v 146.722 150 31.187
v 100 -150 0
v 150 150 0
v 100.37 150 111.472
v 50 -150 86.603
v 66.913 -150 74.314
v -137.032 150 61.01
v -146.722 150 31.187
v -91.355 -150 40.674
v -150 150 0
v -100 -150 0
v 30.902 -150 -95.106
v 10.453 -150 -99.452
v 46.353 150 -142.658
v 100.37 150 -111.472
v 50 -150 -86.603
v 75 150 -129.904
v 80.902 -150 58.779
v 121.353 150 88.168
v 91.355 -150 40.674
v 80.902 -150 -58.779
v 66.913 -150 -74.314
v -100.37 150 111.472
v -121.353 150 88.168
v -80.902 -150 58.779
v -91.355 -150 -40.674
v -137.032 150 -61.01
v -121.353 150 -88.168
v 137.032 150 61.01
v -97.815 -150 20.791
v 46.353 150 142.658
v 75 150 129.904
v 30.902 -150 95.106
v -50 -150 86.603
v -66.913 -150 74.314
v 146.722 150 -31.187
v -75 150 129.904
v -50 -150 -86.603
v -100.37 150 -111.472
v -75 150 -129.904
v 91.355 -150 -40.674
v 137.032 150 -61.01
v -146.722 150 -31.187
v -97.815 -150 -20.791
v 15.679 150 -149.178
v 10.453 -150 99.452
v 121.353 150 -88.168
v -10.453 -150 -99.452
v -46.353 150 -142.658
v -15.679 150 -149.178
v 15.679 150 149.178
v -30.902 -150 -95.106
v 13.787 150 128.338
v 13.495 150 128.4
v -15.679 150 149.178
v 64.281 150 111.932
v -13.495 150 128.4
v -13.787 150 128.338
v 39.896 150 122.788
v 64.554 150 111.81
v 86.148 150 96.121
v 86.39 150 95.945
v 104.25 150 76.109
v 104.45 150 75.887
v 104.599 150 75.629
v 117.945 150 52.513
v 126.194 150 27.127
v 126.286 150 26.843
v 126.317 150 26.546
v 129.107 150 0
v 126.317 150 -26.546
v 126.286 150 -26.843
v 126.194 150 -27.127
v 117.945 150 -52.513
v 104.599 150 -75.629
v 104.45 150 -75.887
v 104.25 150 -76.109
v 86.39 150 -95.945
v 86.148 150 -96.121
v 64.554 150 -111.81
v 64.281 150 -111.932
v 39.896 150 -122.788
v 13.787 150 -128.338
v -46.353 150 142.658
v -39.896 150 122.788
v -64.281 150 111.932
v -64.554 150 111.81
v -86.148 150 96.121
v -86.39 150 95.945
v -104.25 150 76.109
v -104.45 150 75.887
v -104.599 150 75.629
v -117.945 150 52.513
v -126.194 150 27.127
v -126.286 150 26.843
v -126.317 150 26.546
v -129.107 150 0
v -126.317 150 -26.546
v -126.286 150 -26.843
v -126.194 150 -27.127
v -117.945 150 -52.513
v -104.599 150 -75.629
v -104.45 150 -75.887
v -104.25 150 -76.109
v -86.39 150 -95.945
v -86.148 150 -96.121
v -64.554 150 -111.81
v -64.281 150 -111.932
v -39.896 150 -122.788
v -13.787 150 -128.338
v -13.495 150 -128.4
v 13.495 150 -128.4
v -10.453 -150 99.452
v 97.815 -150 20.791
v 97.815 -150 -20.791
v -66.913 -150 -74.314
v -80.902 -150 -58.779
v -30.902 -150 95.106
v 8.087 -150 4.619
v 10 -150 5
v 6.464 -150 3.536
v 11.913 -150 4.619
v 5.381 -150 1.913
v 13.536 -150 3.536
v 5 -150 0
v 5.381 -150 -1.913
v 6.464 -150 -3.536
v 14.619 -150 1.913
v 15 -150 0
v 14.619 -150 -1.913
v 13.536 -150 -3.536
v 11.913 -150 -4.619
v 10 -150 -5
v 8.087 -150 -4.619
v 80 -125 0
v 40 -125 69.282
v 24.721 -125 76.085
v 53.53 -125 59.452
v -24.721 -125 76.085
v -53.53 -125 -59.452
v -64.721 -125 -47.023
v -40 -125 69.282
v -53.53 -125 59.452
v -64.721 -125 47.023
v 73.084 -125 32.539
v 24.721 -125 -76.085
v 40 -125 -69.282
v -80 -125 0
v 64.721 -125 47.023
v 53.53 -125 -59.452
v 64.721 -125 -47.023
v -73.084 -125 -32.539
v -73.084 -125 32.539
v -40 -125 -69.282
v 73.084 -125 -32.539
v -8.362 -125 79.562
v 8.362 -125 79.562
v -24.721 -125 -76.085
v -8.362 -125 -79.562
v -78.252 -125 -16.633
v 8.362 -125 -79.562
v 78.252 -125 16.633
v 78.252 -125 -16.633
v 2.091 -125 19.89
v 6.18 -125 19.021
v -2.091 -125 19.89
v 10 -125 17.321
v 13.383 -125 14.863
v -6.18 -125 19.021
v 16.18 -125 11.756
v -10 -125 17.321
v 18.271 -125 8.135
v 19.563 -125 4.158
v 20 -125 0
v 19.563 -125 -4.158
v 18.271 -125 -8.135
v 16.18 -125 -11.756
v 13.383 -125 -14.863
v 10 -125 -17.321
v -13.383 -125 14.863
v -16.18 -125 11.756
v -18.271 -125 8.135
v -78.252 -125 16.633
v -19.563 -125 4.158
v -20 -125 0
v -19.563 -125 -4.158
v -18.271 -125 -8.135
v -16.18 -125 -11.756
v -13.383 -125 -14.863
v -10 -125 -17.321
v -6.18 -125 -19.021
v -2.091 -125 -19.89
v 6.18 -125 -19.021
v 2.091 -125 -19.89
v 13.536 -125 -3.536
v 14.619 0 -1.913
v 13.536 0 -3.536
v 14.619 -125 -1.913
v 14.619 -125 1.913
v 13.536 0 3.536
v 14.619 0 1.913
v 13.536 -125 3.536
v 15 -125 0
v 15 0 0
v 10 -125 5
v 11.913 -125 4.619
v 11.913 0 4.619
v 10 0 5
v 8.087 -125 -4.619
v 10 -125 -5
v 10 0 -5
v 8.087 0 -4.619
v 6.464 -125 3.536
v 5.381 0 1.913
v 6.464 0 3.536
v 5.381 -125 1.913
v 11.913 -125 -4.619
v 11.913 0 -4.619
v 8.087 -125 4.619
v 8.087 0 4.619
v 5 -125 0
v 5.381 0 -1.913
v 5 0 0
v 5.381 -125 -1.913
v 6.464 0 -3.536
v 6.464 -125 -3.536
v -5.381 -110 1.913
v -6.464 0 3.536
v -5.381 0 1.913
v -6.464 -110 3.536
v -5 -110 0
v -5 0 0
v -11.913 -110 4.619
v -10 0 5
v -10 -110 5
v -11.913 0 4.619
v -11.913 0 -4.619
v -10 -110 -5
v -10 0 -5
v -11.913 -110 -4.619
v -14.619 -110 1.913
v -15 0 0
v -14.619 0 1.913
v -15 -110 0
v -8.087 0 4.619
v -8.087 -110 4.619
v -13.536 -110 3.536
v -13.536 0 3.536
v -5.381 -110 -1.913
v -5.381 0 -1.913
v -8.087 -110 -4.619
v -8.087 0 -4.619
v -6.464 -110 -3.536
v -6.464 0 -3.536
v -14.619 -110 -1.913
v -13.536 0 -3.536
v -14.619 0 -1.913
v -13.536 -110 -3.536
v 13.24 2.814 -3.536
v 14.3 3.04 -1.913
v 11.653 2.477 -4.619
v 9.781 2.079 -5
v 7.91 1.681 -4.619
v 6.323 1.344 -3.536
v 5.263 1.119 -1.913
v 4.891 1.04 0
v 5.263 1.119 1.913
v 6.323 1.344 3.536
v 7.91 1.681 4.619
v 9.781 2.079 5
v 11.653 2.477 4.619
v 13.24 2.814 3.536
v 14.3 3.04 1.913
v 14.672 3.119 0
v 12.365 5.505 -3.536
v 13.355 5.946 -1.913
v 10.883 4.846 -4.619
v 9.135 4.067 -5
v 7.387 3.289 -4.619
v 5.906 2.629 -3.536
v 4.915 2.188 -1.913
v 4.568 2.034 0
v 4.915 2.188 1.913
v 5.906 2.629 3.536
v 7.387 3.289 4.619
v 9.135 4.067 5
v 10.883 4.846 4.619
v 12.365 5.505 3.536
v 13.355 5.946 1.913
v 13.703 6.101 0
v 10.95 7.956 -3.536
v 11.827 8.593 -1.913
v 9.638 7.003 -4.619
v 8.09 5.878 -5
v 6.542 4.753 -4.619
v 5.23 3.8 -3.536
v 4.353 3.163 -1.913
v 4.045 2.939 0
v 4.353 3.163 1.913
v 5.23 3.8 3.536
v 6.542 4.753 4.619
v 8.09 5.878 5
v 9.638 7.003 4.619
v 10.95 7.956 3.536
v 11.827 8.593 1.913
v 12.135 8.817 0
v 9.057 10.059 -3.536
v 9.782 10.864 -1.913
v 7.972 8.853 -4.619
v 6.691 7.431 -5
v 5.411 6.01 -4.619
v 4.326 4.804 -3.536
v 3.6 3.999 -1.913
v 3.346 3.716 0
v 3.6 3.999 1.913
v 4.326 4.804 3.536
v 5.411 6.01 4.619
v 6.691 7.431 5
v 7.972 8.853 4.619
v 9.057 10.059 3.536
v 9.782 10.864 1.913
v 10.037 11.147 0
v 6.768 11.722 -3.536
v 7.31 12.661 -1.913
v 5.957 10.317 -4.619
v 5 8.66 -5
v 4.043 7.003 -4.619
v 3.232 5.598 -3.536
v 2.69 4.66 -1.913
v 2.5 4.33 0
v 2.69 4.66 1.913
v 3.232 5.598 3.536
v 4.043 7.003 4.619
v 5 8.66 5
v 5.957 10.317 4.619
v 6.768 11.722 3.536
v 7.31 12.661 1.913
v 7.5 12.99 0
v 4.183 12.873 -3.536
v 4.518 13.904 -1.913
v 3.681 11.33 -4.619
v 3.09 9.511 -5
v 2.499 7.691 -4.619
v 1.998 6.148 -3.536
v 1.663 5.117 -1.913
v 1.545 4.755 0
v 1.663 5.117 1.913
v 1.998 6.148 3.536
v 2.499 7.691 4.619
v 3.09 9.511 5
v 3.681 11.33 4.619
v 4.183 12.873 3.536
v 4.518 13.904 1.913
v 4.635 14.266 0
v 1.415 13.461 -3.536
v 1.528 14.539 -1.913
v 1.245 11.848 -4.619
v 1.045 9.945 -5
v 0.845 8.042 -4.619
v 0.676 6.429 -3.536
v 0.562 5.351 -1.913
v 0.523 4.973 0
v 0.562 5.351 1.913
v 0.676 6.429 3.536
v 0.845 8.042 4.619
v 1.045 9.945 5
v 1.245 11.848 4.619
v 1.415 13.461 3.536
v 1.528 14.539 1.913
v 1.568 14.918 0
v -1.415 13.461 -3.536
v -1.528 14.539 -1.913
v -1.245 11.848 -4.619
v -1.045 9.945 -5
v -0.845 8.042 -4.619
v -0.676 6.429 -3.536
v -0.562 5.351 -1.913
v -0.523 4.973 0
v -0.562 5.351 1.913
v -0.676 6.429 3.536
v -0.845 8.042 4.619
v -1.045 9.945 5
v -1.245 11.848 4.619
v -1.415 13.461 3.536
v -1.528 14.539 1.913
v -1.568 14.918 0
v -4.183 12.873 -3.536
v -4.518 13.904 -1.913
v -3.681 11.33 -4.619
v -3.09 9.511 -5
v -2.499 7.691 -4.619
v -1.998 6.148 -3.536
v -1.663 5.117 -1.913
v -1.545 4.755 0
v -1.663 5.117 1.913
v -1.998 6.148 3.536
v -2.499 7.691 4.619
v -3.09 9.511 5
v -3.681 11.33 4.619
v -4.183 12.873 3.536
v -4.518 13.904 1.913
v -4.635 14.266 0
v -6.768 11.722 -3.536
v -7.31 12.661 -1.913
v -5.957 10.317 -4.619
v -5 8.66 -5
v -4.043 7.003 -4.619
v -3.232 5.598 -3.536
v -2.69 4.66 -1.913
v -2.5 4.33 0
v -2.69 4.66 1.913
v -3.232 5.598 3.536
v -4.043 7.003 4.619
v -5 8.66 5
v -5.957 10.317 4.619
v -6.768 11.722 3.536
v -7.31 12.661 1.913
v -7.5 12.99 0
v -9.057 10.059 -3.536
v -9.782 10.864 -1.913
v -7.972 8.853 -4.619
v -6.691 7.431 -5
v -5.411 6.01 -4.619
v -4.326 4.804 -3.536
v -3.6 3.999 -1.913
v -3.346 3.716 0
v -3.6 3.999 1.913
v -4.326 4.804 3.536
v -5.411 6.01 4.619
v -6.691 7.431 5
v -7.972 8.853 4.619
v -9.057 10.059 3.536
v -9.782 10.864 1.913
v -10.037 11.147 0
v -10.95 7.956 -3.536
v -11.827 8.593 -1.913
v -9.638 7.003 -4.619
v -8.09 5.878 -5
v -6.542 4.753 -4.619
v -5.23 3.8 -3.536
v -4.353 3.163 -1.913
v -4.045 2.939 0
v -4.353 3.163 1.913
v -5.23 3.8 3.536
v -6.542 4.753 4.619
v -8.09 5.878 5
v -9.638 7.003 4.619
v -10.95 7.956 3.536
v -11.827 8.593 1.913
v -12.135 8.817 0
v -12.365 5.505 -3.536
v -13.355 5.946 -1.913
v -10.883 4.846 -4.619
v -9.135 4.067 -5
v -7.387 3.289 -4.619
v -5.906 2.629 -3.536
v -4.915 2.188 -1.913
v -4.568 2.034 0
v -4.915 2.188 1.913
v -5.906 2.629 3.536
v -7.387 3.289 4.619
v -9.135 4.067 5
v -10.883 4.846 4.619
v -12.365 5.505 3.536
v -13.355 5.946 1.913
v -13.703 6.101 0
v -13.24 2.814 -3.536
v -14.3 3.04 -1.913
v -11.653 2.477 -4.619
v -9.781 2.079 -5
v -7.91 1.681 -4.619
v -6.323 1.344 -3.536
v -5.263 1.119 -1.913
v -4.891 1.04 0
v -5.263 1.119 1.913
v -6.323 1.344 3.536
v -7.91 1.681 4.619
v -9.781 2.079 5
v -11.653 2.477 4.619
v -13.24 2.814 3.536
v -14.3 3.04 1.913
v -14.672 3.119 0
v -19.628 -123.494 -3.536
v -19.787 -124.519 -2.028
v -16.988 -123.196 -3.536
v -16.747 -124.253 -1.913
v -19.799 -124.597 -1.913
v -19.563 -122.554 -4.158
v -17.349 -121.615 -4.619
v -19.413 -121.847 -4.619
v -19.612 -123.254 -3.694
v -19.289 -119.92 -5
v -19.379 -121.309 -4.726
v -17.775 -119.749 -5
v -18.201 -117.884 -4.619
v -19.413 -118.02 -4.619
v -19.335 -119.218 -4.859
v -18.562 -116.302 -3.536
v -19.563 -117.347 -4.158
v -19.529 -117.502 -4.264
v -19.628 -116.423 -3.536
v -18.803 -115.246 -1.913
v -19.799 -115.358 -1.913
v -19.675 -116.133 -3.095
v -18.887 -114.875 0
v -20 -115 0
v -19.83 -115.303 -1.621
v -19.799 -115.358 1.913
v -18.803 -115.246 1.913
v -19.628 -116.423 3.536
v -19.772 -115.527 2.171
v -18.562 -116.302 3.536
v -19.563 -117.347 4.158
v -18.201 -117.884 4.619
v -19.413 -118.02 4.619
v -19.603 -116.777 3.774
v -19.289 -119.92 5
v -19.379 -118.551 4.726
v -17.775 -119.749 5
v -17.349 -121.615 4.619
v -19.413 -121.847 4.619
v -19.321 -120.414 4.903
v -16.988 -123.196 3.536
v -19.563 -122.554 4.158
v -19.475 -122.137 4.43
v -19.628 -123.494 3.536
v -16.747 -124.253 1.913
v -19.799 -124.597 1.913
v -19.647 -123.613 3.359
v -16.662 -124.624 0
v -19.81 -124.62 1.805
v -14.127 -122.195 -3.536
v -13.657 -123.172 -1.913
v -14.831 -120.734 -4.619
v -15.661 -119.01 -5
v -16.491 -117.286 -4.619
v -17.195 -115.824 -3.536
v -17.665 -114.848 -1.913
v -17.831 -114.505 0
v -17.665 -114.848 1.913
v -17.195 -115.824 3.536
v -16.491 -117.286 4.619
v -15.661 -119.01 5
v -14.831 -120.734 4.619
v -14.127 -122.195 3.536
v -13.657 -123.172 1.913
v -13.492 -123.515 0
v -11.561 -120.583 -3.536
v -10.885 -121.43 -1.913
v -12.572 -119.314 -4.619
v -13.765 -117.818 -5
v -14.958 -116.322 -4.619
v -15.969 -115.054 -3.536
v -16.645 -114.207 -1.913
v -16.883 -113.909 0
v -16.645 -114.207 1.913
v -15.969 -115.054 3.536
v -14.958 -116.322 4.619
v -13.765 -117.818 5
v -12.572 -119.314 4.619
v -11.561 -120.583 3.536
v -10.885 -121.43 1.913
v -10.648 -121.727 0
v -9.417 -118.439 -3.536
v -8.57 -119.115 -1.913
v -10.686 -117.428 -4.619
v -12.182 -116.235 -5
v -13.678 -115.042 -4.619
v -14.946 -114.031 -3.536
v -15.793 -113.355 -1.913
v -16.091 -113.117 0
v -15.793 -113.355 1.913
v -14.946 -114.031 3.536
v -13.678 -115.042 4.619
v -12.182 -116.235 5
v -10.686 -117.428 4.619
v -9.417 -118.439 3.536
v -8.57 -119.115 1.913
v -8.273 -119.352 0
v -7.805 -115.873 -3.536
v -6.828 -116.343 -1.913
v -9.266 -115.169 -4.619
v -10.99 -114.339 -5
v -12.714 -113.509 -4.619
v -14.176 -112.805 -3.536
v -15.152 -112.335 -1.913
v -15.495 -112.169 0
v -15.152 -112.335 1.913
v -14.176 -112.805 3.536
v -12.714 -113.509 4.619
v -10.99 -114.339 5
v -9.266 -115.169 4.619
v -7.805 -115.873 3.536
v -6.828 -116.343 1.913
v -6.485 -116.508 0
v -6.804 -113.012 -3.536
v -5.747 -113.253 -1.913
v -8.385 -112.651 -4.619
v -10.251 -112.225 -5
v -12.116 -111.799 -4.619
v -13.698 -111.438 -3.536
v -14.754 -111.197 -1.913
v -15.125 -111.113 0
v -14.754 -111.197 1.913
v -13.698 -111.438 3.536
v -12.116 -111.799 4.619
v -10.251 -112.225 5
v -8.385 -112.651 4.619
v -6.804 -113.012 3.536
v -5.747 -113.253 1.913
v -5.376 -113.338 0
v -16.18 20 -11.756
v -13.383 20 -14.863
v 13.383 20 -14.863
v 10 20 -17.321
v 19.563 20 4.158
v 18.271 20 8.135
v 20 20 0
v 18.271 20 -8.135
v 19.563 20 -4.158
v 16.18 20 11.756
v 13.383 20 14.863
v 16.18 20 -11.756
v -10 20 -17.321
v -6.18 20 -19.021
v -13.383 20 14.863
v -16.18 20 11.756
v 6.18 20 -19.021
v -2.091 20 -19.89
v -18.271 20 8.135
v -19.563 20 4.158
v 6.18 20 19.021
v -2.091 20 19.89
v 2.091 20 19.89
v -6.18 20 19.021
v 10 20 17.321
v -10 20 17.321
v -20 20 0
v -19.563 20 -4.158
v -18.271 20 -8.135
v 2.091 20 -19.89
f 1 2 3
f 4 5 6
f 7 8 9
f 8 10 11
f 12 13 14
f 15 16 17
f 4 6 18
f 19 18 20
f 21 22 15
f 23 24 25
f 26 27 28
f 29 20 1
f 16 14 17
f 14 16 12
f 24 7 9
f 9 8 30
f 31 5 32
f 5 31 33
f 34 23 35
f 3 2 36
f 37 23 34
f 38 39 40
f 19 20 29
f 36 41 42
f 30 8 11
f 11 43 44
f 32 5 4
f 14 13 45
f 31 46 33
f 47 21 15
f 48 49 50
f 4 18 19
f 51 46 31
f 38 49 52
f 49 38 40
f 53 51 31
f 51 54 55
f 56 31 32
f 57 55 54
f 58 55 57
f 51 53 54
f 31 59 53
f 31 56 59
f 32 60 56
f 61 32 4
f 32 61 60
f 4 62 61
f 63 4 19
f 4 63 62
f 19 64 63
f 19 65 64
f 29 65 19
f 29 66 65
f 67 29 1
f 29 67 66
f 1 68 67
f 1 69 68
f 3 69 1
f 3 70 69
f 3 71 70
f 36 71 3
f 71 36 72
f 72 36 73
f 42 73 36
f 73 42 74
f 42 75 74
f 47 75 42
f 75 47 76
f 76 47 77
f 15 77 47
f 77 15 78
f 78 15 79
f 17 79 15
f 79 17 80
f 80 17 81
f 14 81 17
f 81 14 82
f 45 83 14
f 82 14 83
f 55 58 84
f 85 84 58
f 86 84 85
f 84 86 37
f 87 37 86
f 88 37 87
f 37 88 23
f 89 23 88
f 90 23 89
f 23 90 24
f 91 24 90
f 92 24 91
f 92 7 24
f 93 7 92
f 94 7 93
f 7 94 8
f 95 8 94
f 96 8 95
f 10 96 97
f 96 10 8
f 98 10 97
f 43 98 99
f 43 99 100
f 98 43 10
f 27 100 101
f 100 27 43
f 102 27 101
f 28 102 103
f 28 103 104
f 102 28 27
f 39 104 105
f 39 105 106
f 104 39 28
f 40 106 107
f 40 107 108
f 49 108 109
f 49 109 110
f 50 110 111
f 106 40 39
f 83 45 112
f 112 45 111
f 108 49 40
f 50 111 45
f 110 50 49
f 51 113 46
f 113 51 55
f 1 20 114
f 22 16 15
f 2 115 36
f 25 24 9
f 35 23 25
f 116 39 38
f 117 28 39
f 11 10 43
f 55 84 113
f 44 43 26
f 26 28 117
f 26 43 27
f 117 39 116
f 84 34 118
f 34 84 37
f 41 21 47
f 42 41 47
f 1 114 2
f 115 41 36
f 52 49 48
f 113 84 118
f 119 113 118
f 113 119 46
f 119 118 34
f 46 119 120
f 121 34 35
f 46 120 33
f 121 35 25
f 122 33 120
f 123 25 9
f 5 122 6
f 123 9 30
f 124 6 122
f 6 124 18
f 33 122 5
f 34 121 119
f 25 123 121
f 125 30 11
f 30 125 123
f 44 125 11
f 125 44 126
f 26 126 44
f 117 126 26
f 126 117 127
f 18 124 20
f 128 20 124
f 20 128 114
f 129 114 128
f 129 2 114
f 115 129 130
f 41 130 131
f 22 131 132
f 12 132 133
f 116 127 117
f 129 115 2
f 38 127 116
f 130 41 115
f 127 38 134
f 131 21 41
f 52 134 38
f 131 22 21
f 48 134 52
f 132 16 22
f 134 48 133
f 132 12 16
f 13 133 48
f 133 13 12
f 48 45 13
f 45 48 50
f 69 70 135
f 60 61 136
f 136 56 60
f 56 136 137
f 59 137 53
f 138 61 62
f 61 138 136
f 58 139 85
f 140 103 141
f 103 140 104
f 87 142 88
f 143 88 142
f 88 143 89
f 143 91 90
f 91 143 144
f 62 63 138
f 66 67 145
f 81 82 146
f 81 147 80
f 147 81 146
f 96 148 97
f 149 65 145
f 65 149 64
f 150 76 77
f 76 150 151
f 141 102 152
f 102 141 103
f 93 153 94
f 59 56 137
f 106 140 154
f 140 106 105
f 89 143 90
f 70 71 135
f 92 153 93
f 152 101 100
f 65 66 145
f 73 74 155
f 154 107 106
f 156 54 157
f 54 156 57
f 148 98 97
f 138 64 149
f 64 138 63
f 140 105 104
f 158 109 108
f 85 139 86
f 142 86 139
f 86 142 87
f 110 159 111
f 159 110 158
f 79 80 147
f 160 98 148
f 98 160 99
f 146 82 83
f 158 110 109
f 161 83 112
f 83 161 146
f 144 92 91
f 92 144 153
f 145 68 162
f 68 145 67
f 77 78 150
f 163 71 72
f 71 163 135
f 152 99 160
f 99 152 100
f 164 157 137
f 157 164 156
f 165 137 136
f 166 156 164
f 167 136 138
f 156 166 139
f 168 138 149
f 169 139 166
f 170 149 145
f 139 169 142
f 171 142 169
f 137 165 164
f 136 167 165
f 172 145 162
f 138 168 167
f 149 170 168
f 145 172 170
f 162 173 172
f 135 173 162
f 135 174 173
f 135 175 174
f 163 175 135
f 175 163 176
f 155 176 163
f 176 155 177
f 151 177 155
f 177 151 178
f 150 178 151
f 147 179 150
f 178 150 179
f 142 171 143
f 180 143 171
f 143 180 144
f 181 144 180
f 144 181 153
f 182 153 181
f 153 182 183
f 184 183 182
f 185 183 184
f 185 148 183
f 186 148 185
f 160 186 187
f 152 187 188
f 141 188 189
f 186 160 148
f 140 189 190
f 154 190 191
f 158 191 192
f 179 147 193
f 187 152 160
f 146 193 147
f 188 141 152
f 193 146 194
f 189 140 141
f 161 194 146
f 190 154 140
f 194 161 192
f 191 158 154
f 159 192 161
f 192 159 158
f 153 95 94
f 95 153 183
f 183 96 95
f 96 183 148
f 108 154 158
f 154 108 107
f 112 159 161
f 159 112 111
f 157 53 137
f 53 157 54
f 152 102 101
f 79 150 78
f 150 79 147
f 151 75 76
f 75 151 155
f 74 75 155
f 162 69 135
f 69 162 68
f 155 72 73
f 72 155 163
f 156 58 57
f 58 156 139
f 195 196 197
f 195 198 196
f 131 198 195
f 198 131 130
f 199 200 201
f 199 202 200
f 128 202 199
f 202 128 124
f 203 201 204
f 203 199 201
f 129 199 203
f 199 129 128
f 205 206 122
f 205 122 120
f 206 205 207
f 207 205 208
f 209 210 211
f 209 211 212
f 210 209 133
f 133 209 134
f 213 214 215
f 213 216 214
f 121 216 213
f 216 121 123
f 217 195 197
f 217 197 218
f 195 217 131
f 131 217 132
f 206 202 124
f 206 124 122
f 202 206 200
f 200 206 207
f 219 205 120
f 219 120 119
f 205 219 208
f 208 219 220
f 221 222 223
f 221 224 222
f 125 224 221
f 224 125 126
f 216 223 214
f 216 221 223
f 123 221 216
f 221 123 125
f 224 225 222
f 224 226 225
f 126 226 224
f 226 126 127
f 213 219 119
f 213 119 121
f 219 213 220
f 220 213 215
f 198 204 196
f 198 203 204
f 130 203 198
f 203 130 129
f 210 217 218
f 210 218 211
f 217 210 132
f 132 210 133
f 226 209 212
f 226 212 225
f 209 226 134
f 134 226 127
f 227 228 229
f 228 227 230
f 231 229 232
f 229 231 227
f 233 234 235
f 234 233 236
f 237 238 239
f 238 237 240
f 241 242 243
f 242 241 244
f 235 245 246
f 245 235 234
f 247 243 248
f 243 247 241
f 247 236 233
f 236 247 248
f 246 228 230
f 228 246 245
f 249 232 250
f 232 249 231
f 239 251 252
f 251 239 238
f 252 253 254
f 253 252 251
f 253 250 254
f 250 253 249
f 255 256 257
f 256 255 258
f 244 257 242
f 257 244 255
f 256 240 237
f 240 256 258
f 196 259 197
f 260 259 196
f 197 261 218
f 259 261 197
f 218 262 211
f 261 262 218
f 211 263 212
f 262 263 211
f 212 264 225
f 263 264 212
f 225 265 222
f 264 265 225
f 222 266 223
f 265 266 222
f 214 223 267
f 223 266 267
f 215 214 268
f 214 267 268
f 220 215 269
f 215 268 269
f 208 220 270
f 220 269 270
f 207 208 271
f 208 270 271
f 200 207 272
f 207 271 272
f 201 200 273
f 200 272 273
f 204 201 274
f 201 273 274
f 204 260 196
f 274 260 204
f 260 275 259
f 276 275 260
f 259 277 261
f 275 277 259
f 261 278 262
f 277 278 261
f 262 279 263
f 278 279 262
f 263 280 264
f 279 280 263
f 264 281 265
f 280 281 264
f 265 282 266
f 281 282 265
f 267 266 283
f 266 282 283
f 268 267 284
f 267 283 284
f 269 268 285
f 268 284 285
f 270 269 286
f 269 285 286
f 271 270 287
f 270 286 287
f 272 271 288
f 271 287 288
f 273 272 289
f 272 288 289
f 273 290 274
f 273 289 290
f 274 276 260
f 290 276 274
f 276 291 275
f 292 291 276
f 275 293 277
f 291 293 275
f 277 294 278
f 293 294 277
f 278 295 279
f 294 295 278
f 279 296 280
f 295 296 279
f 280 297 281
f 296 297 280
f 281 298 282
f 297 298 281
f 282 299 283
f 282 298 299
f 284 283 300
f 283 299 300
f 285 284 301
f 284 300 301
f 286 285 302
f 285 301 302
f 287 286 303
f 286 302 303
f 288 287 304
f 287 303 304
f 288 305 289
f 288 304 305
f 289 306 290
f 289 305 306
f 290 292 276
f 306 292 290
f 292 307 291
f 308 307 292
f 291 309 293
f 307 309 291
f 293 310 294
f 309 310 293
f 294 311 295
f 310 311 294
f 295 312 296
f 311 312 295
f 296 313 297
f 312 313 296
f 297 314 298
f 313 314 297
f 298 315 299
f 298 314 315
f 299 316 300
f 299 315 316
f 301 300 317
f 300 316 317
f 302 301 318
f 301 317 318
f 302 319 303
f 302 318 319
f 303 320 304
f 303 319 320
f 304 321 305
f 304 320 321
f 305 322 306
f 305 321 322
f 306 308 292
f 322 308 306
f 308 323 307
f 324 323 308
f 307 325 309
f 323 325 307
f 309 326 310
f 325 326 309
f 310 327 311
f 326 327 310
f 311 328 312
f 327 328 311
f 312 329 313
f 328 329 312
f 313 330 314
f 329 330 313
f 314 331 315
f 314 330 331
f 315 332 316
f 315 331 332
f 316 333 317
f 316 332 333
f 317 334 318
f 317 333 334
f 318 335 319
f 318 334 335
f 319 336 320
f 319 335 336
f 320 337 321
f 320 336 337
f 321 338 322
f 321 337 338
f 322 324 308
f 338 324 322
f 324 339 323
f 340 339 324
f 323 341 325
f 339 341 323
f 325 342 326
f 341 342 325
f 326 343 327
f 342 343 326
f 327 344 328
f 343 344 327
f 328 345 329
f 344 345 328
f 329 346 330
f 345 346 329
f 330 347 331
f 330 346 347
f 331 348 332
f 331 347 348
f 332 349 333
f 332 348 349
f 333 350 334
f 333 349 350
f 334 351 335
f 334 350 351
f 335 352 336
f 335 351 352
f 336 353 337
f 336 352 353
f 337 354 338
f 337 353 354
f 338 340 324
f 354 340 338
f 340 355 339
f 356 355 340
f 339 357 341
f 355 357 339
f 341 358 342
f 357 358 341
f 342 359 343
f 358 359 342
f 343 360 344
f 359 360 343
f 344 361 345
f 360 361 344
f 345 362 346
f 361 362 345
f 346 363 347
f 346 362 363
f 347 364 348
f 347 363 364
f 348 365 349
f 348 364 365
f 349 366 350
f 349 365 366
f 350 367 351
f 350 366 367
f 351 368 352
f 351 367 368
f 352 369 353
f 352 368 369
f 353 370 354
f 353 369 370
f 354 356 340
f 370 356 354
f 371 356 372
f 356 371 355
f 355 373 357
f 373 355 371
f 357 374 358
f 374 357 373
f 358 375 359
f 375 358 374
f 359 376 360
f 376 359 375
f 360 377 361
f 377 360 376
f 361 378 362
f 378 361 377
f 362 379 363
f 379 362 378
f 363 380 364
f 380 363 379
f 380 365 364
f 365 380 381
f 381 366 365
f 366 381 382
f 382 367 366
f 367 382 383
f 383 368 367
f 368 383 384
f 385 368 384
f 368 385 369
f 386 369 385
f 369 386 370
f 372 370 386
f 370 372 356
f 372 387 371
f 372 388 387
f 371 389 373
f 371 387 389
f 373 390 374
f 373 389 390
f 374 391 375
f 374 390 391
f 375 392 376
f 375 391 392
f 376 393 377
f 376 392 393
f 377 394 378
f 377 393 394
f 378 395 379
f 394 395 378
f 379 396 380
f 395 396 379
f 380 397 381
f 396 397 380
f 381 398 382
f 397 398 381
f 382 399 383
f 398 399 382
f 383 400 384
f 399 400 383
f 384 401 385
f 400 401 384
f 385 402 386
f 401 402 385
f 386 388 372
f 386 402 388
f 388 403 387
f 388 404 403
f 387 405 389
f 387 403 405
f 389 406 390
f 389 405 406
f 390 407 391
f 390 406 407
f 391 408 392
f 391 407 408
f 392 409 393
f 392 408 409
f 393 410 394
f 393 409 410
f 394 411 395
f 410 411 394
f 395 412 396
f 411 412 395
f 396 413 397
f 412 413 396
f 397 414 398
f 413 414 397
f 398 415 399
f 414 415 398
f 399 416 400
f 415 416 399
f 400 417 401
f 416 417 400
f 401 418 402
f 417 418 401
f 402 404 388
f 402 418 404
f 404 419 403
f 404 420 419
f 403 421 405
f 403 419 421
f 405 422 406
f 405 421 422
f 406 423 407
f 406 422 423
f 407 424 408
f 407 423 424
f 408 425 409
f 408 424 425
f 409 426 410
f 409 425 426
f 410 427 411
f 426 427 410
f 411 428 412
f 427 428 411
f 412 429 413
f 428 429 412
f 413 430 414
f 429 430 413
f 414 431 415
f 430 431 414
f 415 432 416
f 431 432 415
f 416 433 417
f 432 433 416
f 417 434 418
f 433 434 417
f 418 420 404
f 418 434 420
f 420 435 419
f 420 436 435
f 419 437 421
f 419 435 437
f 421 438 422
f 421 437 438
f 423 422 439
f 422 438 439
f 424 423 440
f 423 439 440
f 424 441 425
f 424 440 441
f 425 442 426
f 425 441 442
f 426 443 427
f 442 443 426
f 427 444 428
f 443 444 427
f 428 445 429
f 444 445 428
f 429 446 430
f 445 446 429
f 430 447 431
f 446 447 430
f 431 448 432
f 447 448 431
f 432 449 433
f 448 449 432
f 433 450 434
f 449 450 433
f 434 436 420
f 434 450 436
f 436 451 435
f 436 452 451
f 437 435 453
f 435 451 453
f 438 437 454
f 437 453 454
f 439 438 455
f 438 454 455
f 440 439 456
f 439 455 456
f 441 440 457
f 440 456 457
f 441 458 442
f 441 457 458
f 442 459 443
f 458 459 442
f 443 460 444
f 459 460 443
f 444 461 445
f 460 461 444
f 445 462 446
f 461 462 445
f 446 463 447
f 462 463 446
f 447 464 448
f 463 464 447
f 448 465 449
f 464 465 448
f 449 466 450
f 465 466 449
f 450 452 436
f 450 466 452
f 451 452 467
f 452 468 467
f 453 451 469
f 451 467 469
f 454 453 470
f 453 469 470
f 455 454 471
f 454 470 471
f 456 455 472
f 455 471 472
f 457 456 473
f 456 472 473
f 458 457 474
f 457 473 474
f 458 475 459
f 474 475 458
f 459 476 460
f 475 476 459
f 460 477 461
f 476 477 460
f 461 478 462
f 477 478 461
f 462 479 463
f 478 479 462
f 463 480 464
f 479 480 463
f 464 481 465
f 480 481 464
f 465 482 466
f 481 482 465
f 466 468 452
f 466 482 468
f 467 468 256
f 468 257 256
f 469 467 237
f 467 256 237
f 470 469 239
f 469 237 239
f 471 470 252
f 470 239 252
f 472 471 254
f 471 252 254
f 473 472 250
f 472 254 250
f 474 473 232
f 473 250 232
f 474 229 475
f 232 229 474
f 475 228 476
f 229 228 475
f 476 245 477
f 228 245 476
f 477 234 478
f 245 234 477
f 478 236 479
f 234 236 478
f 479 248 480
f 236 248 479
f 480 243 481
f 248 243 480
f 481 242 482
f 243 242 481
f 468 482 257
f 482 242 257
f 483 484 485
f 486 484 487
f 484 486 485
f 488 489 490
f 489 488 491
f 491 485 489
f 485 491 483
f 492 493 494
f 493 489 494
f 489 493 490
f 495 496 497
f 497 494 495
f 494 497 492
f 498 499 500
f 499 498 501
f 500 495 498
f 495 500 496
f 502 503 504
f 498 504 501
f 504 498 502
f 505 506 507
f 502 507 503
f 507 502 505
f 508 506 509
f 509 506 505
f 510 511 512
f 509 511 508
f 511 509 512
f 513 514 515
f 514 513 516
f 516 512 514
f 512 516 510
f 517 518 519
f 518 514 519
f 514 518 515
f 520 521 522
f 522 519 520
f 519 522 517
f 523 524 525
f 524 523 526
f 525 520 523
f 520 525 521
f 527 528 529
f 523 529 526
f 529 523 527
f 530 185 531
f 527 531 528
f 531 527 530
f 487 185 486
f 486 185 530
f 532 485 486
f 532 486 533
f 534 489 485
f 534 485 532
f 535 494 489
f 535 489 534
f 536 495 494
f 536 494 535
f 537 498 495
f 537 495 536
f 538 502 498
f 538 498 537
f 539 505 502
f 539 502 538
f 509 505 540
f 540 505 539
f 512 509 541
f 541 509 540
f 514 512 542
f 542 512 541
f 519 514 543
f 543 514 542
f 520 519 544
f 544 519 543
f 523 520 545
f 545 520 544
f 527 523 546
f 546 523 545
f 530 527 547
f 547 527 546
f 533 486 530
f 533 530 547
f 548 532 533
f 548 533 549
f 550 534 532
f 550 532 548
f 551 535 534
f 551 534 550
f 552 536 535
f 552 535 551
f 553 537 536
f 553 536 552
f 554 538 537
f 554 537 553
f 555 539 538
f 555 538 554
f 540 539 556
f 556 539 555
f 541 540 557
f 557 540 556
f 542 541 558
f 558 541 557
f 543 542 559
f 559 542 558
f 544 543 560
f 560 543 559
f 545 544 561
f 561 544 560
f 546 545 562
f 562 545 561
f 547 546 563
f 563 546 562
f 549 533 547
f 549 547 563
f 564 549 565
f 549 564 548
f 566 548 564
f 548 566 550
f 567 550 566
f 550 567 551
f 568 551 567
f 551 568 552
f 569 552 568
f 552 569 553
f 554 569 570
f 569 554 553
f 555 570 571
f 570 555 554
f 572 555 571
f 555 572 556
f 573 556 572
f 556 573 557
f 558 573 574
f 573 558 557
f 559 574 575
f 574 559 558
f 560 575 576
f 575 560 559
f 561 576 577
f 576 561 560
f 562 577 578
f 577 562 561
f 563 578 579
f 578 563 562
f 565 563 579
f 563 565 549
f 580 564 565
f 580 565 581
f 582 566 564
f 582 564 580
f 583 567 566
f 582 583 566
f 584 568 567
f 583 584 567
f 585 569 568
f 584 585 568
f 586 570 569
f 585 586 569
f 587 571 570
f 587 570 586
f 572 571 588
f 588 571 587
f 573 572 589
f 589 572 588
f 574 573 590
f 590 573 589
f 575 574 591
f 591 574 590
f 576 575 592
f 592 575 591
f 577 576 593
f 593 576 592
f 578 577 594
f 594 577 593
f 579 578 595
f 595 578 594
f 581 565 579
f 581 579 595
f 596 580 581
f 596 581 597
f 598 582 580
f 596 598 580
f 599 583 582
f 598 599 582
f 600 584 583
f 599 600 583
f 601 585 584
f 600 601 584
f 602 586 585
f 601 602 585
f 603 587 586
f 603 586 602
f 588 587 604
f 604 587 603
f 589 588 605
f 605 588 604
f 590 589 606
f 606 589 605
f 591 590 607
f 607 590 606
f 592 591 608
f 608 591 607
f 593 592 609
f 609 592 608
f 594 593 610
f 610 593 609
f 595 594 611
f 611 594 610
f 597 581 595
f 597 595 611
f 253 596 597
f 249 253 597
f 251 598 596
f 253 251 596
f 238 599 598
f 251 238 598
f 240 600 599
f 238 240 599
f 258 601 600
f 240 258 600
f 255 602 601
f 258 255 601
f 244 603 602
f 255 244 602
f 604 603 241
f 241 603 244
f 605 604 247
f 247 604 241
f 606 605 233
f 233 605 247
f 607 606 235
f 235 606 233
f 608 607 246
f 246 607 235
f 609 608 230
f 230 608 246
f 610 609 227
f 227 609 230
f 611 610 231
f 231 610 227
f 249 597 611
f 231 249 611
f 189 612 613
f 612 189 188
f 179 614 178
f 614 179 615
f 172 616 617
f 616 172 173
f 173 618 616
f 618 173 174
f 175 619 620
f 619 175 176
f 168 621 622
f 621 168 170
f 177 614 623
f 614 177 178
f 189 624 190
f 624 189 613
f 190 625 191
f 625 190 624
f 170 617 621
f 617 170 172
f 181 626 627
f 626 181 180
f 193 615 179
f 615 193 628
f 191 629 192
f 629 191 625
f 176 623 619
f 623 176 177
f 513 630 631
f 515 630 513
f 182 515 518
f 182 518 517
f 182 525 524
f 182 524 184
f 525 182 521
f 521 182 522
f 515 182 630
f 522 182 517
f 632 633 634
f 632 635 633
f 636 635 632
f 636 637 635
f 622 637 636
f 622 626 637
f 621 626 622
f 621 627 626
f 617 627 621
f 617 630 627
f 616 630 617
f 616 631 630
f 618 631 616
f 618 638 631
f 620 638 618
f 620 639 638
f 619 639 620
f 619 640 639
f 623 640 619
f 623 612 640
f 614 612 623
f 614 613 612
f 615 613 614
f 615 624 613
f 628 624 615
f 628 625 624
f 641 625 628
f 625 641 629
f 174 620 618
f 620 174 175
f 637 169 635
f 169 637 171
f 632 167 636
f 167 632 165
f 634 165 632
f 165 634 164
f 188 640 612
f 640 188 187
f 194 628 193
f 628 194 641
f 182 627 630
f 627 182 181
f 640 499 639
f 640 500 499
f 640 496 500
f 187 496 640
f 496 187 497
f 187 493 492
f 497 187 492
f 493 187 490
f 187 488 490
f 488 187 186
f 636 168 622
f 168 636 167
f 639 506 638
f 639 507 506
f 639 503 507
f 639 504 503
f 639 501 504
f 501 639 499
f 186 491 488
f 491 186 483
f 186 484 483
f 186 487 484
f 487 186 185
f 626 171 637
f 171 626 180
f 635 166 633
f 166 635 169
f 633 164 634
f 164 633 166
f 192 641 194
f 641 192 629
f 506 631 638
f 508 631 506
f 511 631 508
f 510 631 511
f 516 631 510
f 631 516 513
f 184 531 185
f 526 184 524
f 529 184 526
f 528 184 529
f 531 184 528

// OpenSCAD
CROSS_SECTION = true;
RESOLUTION = 0.20;

module u_pipe() {
    rotate_extrude(angle=180) {
        translate([10, 0, 0])
        circle(5);
    }
}

module pipes() {
    rotate([90, 0, 0])
    translate([10, 0, 0])
    cylinder(150, 5, 5);

    rotate([90, 0, 0])
    translate([-10, 0, 0])
    cylinder(110, 5, 5);
}

module elbow() {
    rotate_extrude(angle=90) {
        translate([10, 0, 0])
        circle(5);
    }
}

module pipe() {
    rotate([90, 0, 0])
    translate([0, 0, -20])
    cylinder(170, 20, 20);
}

module inner_path() {
    union() {
        u_pipe();
        pipes();
        translate([-20, -110, 0])
        rotate([0, 0, -90])
        elbow();
    }
}

module siphon() {
    difference() {
        pipe();
        inner_path();
    }
}

module outer() {
    rotate([90, 0, 0])
    translate([0, 0, -150])
    cylinder(300, 150, 100);
}

module inner() {
    rotate([90, 0, 0])
    translate([0, 0, -155])
    cylinder(280, 130, 80);
}

module cup() {
    difference() {
        outer();
        inner();
    }
}

module cup_hole() {
    difference() {
        cup();
        rotate([90, 0, 0])
        translate([10, 0, 120])
        cylinder(30, 5, 5);
    }
}

union() {
    cup_hole();
    siphon();
}
